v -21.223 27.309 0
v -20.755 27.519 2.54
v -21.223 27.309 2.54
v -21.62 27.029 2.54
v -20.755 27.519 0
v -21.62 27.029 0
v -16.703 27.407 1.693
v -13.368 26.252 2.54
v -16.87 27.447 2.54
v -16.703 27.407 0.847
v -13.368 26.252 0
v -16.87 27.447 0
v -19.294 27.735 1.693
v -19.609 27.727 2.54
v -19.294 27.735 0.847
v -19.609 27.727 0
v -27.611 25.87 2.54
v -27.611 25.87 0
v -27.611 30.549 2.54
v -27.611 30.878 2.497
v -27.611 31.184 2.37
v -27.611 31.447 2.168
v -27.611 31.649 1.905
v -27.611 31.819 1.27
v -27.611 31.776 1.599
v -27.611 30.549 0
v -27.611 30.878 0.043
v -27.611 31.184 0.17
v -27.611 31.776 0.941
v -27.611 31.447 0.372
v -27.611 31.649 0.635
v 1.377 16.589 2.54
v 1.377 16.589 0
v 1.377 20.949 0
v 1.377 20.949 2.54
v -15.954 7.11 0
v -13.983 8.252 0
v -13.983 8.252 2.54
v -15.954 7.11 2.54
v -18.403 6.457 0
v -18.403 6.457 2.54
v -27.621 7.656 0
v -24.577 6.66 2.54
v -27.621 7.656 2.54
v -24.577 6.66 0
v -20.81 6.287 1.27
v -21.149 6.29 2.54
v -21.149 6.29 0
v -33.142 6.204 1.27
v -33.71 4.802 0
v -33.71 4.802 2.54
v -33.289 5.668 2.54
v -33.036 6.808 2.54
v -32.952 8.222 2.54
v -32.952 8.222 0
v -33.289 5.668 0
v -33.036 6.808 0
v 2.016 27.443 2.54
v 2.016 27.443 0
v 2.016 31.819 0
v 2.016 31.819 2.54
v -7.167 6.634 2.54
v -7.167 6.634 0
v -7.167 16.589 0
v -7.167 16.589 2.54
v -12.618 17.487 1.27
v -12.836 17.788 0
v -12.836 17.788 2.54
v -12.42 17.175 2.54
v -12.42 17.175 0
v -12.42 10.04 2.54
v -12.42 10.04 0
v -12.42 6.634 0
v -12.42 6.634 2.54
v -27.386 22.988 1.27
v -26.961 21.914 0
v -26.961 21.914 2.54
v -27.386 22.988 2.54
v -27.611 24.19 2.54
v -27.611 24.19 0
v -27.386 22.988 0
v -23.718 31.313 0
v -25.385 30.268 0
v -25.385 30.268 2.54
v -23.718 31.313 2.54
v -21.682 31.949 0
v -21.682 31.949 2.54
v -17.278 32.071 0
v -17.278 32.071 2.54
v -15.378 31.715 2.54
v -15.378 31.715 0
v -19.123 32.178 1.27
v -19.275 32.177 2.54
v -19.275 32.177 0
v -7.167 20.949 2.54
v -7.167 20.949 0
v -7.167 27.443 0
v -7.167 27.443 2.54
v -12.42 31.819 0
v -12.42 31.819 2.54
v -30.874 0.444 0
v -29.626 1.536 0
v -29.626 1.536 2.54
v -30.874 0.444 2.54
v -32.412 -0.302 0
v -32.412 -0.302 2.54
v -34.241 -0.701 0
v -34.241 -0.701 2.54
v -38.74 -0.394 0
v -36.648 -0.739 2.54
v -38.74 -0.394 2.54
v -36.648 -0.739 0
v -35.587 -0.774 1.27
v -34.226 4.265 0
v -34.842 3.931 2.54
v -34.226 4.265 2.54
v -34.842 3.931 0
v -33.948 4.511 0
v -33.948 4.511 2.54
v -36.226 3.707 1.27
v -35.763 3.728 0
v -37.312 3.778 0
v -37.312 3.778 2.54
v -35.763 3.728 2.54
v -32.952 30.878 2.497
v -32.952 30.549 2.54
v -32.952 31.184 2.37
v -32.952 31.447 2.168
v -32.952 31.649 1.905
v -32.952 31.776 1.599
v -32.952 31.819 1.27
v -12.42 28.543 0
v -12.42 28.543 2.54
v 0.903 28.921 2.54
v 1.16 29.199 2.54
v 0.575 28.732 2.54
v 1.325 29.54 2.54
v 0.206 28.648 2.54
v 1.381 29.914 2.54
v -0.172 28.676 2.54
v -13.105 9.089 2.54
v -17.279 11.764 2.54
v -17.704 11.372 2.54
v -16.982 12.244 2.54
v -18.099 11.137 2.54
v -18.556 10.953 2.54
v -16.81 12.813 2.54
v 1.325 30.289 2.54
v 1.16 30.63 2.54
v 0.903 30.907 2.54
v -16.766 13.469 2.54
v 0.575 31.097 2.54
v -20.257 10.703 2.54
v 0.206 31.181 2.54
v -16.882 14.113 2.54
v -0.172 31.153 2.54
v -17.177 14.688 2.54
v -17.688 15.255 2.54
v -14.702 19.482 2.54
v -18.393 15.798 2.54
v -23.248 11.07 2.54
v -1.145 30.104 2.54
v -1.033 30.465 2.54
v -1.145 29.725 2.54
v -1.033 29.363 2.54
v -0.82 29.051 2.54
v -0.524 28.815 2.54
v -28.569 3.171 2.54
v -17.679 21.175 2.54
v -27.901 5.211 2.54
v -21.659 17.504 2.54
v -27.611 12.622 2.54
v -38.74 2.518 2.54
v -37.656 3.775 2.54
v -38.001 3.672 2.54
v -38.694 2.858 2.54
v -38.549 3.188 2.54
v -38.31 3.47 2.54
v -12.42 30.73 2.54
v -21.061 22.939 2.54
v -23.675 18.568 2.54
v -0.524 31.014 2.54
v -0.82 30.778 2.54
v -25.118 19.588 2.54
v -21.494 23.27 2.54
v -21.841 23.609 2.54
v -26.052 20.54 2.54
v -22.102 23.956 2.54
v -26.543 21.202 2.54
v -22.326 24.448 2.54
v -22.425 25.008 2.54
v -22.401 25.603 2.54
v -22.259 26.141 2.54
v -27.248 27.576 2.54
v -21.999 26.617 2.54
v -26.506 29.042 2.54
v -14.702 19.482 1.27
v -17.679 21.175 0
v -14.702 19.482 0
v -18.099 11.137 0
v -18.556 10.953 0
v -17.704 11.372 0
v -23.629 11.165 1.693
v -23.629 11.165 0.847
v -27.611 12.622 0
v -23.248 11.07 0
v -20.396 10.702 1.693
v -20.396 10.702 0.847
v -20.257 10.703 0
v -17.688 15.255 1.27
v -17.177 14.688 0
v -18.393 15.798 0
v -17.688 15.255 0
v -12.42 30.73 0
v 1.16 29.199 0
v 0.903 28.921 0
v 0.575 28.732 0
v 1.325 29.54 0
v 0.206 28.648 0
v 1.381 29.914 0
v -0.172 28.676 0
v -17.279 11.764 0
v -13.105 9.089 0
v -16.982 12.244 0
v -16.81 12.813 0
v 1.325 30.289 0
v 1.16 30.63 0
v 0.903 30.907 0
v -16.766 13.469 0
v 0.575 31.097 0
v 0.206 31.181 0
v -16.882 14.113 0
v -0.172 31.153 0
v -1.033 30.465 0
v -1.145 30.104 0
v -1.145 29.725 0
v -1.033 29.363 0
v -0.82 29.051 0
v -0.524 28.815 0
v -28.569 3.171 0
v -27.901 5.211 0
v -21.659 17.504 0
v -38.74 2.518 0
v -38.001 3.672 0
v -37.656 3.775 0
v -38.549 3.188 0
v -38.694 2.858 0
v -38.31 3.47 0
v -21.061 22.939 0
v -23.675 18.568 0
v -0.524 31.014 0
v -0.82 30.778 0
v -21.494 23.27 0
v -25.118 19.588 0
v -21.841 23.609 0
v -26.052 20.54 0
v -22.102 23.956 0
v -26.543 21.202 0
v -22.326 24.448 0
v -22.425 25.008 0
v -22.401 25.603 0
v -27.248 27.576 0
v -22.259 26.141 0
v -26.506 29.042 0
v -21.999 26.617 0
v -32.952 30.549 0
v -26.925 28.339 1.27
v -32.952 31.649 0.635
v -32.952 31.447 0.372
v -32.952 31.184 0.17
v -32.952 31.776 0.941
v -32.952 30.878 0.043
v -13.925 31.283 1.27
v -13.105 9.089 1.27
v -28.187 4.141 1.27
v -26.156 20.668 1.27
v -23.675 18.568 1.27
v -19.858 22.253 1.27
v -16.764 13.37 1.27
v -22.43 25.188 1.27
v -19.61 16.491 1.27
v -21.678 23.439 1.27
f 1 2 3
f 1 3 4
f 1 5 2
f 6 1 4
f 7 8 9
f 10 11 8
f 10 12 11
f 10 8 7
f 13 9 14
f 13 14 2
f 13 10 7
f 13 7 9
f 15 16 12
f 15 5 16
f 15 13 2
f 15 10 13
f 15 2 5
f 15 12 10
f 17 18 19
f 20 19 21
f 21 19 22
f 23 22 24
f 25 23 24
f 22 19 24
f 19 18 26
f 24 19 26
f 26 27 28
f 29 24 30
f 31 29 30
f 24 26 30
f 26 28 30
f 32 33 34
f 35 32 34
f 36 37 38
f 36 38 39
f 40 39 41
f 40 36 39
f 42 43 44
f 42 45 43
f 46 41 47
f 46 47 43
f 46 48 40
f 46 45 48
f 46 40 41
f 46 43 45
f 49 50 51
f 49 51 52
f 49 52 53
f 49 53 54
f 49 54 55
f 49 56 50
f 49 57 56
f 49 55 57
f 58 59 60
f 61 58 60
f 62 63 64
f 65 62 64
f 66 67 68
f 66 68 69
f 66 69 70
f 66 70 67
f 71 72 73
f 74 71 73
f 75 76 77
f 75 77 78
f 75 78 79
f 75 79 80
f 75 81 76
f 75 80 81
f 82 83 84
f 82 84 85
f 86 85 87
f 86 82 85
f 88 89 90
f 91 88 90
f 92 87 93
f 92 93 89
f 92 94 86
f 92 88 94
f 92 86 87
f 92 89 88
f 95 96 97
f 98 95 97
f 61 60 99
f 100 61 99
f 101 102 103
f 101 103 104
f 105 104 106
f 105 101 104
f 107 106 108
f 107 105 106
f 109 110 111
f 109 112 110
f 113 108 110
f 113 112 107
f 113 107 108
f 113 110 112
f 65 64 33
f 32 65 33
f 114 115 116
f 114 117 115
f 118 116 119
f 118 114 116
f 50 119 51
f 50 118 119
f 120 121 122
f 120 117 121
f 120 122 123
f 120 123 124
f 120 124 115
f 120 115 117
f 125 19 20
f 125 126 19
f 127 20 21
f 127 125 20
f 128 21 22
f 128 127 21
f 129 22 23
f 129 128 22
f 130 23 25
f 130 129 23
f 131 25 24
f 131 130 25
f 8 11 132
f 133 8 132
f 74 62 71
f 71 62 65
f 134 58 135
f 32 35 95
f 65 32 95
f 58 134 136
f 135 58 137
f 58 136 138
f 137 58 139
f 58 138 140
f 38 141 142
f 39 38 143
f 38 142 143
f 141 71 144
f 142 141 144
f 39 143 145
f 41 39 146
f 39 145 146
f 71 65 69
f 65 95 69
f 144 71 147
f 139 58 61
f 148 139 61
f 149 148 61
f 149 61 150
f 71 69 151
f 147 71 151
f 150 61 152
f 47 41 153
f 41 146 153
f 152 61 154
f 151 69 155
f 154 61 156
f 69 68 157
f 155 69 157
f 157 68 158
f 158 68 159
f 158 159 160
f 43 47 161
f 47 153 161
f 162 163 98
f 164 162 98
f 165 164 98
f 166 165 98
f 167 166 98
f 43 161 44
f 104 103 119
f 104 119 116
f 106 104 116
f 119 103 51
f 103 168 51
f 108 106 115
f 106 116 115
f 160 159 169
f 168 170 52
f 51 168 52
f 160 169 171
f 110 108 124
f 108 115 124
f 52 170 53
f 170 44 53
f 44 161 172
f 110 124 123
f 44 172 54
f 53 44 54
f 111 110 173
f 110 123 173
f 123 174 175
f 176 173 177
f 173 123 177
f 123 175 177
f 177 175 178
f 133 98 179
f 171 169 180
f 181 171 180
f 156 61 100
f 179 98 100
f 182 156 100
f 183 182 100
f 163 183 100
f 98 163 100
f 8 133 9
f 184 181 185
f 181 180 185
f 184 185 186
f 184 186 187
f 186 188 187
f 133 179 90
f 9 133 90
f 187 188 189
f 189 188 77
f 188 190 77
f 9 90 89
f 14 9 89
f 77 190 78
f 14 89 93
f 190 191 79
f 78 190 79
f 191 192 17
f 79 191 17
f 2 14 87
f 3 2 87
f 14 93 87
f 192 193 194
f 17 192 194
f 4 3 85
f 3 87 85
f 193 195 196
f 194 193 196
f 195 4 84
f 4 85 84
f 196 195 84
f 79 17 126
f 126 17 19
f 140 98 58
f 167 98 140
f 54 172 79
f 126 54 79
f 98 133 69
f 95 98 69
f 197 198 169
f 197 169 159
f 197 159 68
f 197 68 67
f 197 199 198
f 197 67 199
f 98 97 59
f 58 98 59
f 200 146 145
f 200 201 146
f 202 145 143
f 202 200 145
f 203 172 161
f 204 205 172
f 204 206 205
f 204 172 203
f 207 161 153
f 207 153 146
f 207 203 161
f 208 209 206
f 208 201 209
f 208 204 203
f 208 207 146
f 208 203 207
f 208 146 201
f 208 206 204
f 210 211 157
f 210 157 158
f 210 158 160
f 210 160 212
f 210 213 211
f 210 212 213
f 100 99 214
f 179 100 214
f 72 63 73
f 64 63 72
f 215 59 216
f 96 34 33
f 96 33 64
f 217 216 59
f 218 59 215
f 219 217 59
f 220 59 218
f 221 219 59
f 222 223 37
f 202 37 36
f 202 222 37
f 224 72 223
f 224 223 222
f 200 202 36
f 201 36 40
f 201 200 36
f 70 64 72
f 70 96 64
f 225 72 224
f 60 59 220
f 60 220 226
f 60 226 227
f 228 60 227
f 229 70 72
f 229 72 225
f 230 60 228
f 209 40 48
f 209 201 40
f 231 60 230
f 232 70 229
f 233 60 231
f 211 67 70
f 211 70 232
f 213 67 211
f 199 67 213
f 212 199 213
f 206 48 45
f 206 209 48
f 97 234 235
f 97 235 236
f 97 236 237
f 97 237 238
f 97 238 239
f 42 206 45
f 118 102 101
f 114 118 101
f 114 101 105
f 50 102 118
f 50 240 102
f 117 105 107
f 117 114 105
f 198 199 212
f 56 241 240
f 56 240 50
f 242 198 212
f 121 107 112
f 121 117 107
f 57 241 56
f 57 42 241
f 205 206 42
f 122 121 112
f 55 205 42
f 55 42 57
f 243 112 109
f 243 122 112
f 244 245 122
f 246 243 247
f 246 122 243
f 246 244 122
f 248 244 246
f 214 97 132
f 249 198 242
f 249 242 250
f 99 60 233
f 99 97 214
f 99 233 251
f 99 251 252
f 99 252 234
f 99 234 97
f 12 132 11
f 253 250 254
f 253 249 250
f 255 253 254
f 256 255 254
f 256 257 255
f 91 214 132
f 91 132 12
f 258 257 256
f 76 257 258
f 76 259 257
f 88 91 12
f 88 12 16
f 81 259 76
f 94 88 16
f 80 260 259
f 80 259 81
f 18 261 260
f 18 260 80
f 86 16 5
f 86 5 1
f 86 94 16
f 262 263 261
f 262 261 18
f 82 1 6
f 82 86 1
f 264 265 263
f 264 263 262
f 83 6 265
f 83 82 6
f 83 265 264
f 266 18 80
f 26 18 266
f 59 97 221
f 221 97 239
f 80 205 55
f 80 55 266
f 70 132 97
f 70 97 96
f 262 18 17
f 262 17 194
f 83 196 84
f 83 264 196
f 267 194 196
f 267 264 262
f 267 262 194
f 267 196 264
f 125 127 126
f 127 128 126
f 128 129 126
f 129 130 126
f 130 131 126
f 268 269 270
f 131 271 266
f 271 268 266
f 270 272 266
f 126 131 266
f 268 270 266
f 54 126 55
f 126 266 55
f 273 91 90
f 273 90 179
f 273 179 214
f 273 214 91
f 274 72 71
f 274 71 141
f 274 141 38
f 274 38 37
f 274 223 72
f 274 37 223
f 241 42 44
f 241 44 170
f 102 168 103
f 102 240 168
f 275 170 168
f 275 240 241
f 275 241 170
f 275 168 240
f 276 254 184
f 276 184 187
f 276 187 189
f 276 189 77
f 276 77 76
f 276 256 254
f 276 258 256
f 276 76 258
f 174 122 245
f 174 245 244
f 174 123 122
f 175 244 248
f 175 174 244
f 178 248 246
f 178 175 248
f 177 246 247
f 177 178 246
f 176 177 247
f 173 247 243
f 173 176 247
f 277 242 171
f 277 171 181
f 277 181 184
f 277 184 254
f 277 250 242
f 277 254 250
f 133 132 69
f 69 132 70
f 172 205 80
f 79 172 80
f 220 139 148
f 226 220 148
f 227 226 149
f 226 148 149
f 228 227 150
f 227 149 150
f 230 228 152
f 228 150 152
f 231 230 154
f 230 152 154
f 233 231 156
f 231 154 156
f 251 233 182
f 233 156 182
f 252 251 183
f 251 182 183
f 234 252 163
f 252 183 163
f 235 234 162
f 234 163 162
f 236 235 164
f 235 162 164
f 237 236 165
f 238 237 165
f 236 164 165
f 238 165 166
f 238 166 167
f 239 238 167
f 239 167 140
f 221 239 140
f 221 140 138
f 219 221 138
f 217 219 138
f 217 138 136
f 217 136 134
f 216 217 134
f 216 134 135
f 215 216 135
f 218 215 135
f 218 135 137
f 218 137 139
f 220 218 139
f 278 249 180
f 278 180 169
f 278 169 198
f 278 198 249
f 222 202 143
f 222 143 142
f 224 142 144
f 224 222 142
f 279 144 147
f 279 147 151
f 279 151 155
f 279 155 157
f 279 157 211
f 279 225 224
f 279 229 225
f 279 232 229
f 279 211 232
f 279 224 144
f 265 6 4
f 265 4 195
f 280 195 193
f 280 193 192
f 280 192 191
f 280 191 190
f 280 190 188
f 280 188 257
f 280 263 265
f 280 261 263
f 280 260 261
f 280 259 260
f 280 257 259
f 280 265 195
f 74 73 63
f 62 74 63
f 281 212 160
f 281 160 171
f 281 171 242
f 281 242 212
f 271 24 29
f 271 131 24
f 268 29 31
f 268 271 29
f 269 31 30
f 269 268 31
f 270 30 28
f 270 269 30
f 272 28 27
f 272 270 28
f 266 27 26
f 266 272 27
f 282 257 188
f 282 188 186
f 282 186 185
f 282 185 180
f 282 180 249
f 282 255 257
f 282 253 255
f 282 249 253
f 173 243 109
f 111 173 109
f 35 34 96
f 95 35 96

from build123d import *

# Parameters (mm, degrees)
F1_DEPTH = 2.54
F2_R     = 1.27
F3_DEPTH = 25.4
F4_R     = 1.27
F5_R     = 1.26999
F6_R     = 1.27


# Not quite as in the source:
# - a fillet or chamfer is up to 0.001 mm smaller than in the source, because OpenCascade refuses the exact size


with BuildPart() as f1:
    # F0 (on Top) → F1 (new body)
    with BuildSketch(Plane.XY):
        with BuildLine():
            add(Edge.make_bspline(
                [(-35.5870129937, -0.7740028705), (-37.3949991048, -0.7740028705), (-38.7399643826, -0.3936643288)],
                knots=[0, 0, 0, 1, 1, 1], degree=2))
            add(Edge.make_bspline(
                [(-29.6256197645, 1.5355891434), (-31.6403116048, -0.7740028705), (-35.5870129937, -0.7740028705)],
                knots=[0, 0, 0, 1, 1, 1], degree=2))
            add(Edge.make_bspline(
                [(-27.6205460855, 7.6555567964), (-27.750131484, 3.6856017003), (-29.6256197645, 1.5355891434)],
                knots=[0.0690942193, 0.0690942193, 0.0690942193, 1, 1, 1], degree=2))
            add(Edge.make_bspline(
                [(-27.6205460855, 7.6555567964), (-27.7827885359, 7.7299650226), (-27.9425390354, 7.8084190045)],
                knots=[0.9484314806, 0.9484314806, 0.9484314806, 1, 1, 1], degree=2))
            Line((-27.9425390354, 7.8084190045), (-27.9425390354, 12.7693565045))
            add(Edge.make_bspline(
                [(-27.9425390354, 12.7693565045), (-27.775046491, 12.6943111437), (-27.6109279243, 12.6221986399)],
                knots=[0, 0, 0, 0.0657706688, 0.0657706688, 0.0657706688], degree=2))
            Line((-27.6109279243, 12.6221986399), (-27.6109279243, 24.1901567001))
            add(Edge.make_bspline(
                [(-27.6109279243, 24.1901567001), (-27.6503949382, 24.5883728176), (-27.6503949382, 25.011847824)],
                knots=[0.7606675952, 0.7606675952, 0.7606675952, 1, 1, 1], degree=2))
            add(Edge.make_bspline(
                [(-27.6503949382, 25.011847824), (-27.6503949382, 25.4534645742), (-27.6109279243, 25.8700663435)],
                knots=[0, 0, 0, 0.1319883501, 0.1319883501, 0.1319883501], degree=2))
            Line((-27.6109279243, 25.8700663435), (-27.6109279243, 31.8193565045))
            Line((-27.6109279243, 31.8193565045), (-32.9522039659, 31.8193565045))
            Line((-32.9522039659, 31.8193565045), (-32.9522039659, 8.2218304629))
            add(Edge.make_bspline(
                [(-33.7101249729, 4.8015396643), (-32.9522039659, 5.8957019906), (-32.9522039659, 8.2218304629)],
                knots=[0, 0, 0, 1, 1, 1], degree=2))
            add(Edge.make_bspline(
                [(-36.2264227159, 3.7073773379), (-34.4680459798, 3.7073773379), (-33.7101249729, 4.8015396643)],
                knots=[0, 0, 0, 1, 1, 1], degree=2))
            add(Edge.make_bspline(
                [(-38.7399643826, 4.0491308101), (-37.3619261882, 3.7073773379), (-36.2264227159, 3.7073773379)],
                knots=[0, 0, 0, 1, 1, 1], degree=2))
            Line((-38.7399643826, 4.0491308101), (-38.7399643826, -0.3936643288))
        make_face()
        with BuildLine():
            add(Edge.make_bspline(
                [(-27.6205460855, 7.6555567964), (-27.7827885359, 7.7299650226), (-27.9425390354, 7.8084190045)],
                knots=[0.9484314806, 0.9484314806, 0.9484314806, 1, 1, 1], degree=2))
            add(Edge.make_bspline(
                [(-27.6109279243, 8.2549033795), (-27.6109279243, 7.9502170655), (-27.6205460855, 7.6555567964)],
                knots=[0, 0, 0, 0.0690942193, 0.0690942193, 0.0690942193], degree=2))
            Line((-27.6109279243, 8.2549033795), (-27.6109279243, 12.6221986399))
            add(Edge.make_bspline(
                [(-27.9425390354, 12.7693565045), (-27.775046491, 12.6943111437), (-27.6109279243, 12.6221986399)],
                knots=[0, 0, 0, 0.0657706688, 0.0657706688, 0.0657706688], degree=2))
            Line((-27.9425390354, 12.7693565045), (-27.9425390354, 7.8084190045))
        make_face()
        with BuildLine():
            add(Edge.make_bspline(
                [(-27.6109279243, 8.2549033795), (-27.6109279243, 7.9502170655), (-27.6205460855, 7.6555567964)],
                knots=[0, 0, 0, 0.0690942193, 0.0690942193, 0.0690942193], degree=2))
            add(Edge.make_bspline(
                [(-20.8098133409, 6.2870648379), (-24.63663557, 6.2870648379), (-27.6205460855, 7.6555567964)],
                knots=[0, 0, 0, 0.9484314806, 0.9484314806, 0.9484314806], degree=2))
            add(Edge.make_bspline(
                [(-13.9830121257, 8.2521473031), (-16.4386761882, 6.2870648379), (-20.8098133409, 6.2870648379)],
                knots=[0, 0, 0, 1, 1, 1], degree=2))
            add(Edge.make_bspline(
                [(-12.4203168132, 10.0403583252), (-13.0081692098, 9.0322404558), (-13.9830121257, 8.2521473031)],
                knots=[0.6030226892, 0.6030226892, 0.6030226892, 1, 1, 1], degree=2))
            Line((-12.4203168132, 10.0403583252), (-12.4203168132, 17.1746575044))
            add(Edge.make_bspline(
                [(-12.8364843479, 17.7881716087), (-12.6085593245, 17.4930686838), (-12.4203168132, 17.1746575044)],
                knots=[0, 0, 0, 0.1741033581, 0.1741033581, 0.1741033581], degree=2))
            add(Edge.make_bspline(
                [(-17.6789105632, 21.1753894906), (-14.1456206326, 19.4831585879), (-12.8364843479, 17.7881716087)],
                knots=[0, 0, 0, 1, 1, 1], degree=2))
            add(Edge.make_bspline(
                [(-21.0606162923, 22.9392783795), (-20.3467925076, 22.4486967823), (-17.6789105632, 21.1753894906)],
                knots=[0, 0, 0, 1, 1, 1], degree=2))
            add(Edge.make_bspline(
                [(-22.1024131673, 23.956270567), (-21.774440077, 23.4298599768), (-21.0606162923, 22.9392783795)],
                knots=[0, 0, 0, 1, 1, 1], degree=2))
            add(Edge.make_bspline(
                [(-22.4303862576, 25.1882367129), (-22.4303862576, 24.4826811573), (-22.1024131673, 23.956270567)],
                knots=[0, 0, 0, 1, 1, 1], degree=2))
            add(Edge.make_bspline(
                [(-21.6200997993, 27.0292957406), (-22.4303862576, 26.3237401851), (-22.4303862576, 25.1882367129)],
                knots=[0, 0, 0, 1, 1, 1], degree=2))
            add(Edge.make_bspline(
                [(-19.293971327, 27.7348512962), (-20.8098133409, 27.7348512962), (-21.6200997993, 27.0292957406)],
                knots=[0, 0, 0, 1, 1, 1], degree=2))
            add(Edge.make_bspline(
                [(-16.7032595215, 27.4068782059), (-18.0206640354, 27.7348512962), (-19.293971327, 27.7348512962)],
                knots=[0, 0, 0, 1, 1, 1], degree=2))
            add(Edge.make_bspline(
                [(-13.3684070909, 26.252082199), (-15.3858550076, 27.0789051156), (-16.7032595215, 27.4068782059)],
                knots=[0, 0, 0, 1, 1, 1], degree=2))
            Line((-13.3684070909, 26.252082199), (-12.4203168132, 28.5433003703))
            Line((-12.4203168132, 28.5433003703), (-12.4203168132, 30.7303313899))
            add(Edge.make_bspline(
                [(-15.3775867784, 31.7146256018), (-13.9509902659, 31.3441955954), (-12.4203168132, 30.7303313899)],
                knots=[0, 0, 0, 0.8000288101, 0.8000288101, 0.8000288101], degree=2))
            add(Edge.make_bspline(
                [(-19.1230945909, 32.1776464351), (-17.160768202, 32.1776464351), (-15.3775867784, 31.7146256018)],
                knots=[0, 0, 0, 1, 1, 1], degree=2))
            add(Edge.make_bspline(
                [(-25.3849001465, 30.2676854976), (-23.1194053548, 32.1776464351), (-19.1230945909, 32.1776464351)],
                knots=[0, 0, 0, 1, 1, 1], degree=2))
            add(Edge.make_bspline(
                [(-27.6109279243, 25.8700663435), (-27.3513760183, 28.6098171531), (-25.3849001465, 30.2676854976)],
                knots=[0.1319883501, 0.1319883501, 0.1319883501, 1, 1, 1], degree=2))
            Line((-27.6109279243, 25.8700663435), (-27.6109279243, 24.1901567001))
            add(Edge.make_bspline(
                [(-26.9613758409, 21.9140179629), (-27.4854903406, 22.9245107183), (-27.6109279243, 24.1901567001)],
                knots=[0, 0, 0, 0.7606675952, 0.7606675952, 0.7606675952], degree=2))
            add(Edge.make_bspline(
                [(-25.1175607368, 19.5878894906), (-26.2723567437, 20.5855891434), (-26.9613758409, 21.9140179629)],
                knots=[0, 0, 0, 1, 1, 1], degree=2))
            add(Edge.make_bspline(
                [(-21.6586848687, 17.5042957406), (-23.9627647298, 18.5901898379), (-25.1175607368, 19.5878894906)],
                knots=[0, 0, 0, 1, 1, 1], degree=2))
            add(Edge.make_bspline(
                [(-18.3927343479, 15.7982844559), (-19.194752577, 16.330207199), (-21.6586848687, 17.5042957406)],
                knots=[0, 0, 0, 1, 1, 1], degree=2))
            add(Edge.make_bspline(
                [(-17.1773046604, 14.6875856712), (-17.5907161187, 15.2663617129), (-18.3927343479, 15.7982844559)],
                knots=[0, 0, 0, 1, 1, 1], degree=2))
            add(Edge.make_bspline(
                [(-16.763893202, 13.3701811573), (-16.763893202, 14.1088096295), (-17.1773046604, 14.6875856712)],
                knots=[0, 0, 0, 1, 1, 1], degree=2))
            add(Edge.make_bspline(
                [(-17.7037152507, 11.3720257754), (-16.763893202, 12.0417523379), (-16.763893202, 13.3701811573)],
                knots=[0, 0, 0, 1, 1, 1], degree=2))
            add(Edge.make_bspline(
                [(-20.3964018826, 10.7022992129), (-18.6435372993, 10.7022992129), (-17.7037152507, 11.3720257754)],
                knots=[0, 0, 0, 1, 1, 1], degree=2))
            add(Edge.make_bspline(
                [(-23.6292794868, 11.1653200462), (-21.8626345215, 10.7022992129), (-20.3964018826, 10.7022992129)],
                knots=[0, 0, 0, 1, 1, 1], degree=2))
            add(Edge.make_bspline(
                [(-27.6109279243, 12.6221986399), (-25.2797310311, 11.5978876896), (-23.6292794868, 11.1653200462)],
                knots=[0.0657706688, 0.0657706688, 0.0657706688, 1, 1, 1], degree=2))
            Line((-27.6109279243, 12.6221986399), (-27.6109279243, 8.2549033795))
        make_face()
        with BuildLine():
            add(Edge.make_bspline(
                [(-27.6109279243, 24.1901567001), (-27.6503949382, 24.5883728176), (-27.6503949382, 25.011847824)],
                knots=[0.7606675952, 0.7606675952, 0.7606675952, 1, 1, 1], degree=2))
            Line((-27.6109279243, 24.1901567001), (-27.6109279243, 25.8700663435))
            add(Edge.make_bspline(
                [(-27.6503949382, 25.011847824), (-27.6503949382, 25.4534645742), (-27.6109279243, 25.8700663435)],
                knots=[0, 0, 0, 0.1319883501, 0.1319883501, 0.1319883501], degree=2))
        make_face()
        with BuildLine():
            Line((-12.4203168132, 17.1746575044), (-12.4203168132, 10.0403583252))
            add(Edge.make_bspline(
                [(-11.5273480632, 13.6292523379), (-11.5273480632, 11.5717253126), (-12.4203168132, 10.0403583252)],
                knots=[0, 0, 0, 0.6030226892, 0.6030226892, 0.6030226892], degree=2))
            add(Edge.make_bspline(
                [(-12.4203168132, 17.1746575044), (-11.5273480632, 15.6642057435), (-11.5273480632, 13.6292523379)],
                knots=[0.1741033581, 0.1741033581, 0.1741033581, 1, 1, 1], degree=2))
        make_face()
        with BuildLine():
            add(Edge.make_bspline(
                [(-11.5273480632, 13.6292523379), (-11.5273480632, 11.5717253126), (-12.4203168132, 10.0403583252)],
                knots=[0, 0, 0, 0.6030226892, 0.6030226892, 0.6030226892], degree=2))
            Line((-12.4203168132, 10.0403583252), (-12.4203168132, 6.6343304629))
            Line((-12.4203168132, 6.6343304629), (-7.1672352159, 6.6343304629))
            Line((-7.1672352159, 6.6343304629), (-7.1672352159, 16.5892783795))
            Line((-7.1672352159, 16.5892783795), (1.3766015896, 16.5892783795))
            Line((1.3766015896, 16.5892783795), (1.3766015896, 20.9493912268))
            Line((1.3766015896, 20.9493912268), (-7.1672352159, 20.9493912268))
            Line((-7.1672352159, 20.9493912268), (-7.1672352159, 27.442707199))
            Line((-7.1672352159, 27.442707199), (2.0160113118, 27.442707199))
            Line((2.0160113118, 27.442707199), (2.0160113118, 31.8193565045))
            Line((2.0160113118, 31.8193565045), (-12.4203168132, 31.8193565045))
            Line((-12.4203168132, 31.8193565045), (-12.4203168132, 30.7303313899))
            add(Edge.make_bspline(
                [(-12.4203168132, 30.7303313899), (-12.037717352, 30.5768929712), (-11.6486154243, 30.4082453934)],
                knots=[0.8000288101, 0.8000288101, 0.8000288101, 1, 1, 1], degree=2))
            Line((-11.6486154243, 30.4082453934), (-12.4203168132, 28.5433003703))
            Line((-12.4203168132, 28.5433003703), (-12.4203168132, 17.1746575044))
            add(Edge.make_bspline(
                [(-12.4203168132, 17.1746575044), (-11.5273480632, 15.6642057435), (-11.5273480632, 13.6292523379)],
                knots=[0.1741033581, 0.1741033581, 0.1741033581, 1, 1, 1], degree=2))
        make_face()
        with BuildLine():
            Line((-12.4203168132, 30.7303313899), (-12.4203168132, 28.5433003703))
            Line((-12.4203168132, 28.5433003703), (-11.6486154243, 30.4082453934))
            add(Edge.make_bspline(
                [(-12.4203168132, 30.7303313899), (-12.037717352, 30.5768929712), (-11.6486154243, 30.4082453934)],
                knots=[0.8000288101, 0.8000288101, 0.8000288101, 1, 1, 1], degree=2))
        make_face()
    extrude(amount=F1_DEPTH)

    # F2 (on face) → F3 (cut)
    with BuildSketch(Plane.XY.offset(2.54)):
        with Locations((0.1110113118, 29.9143565045)):
            Circle(F2_R)
    extrude(amount=-F3_DEPTH, mode=Mode.SUBTRACT)

    # F4
    f4_edges = [f1.edges().sort_by_distance(p)[0] for p in [
        (-30.281566, 31.819357, 2.54),
    ]]
    fillet(f4_edges, radius=F4_R)

    # F5 (radius 1.27 in the source; OpenCascade refuses exactly that, so slightly less here)
    f5_edges = [f1.edges().sort_by_distance(p)[0] for p in [
        (-30.281566, 31.819357, 0),
    ]]
    fillet(f5_edges, radius=F5_R)

    # F6
    f6_edges = [f1.edges().sort_by_distance(p)[0] for p in [
        (-38.739964, 4.049131, 1.27),
    ]]
    fillet(f6_edges, radius=F6_R)


solid = f1.part
